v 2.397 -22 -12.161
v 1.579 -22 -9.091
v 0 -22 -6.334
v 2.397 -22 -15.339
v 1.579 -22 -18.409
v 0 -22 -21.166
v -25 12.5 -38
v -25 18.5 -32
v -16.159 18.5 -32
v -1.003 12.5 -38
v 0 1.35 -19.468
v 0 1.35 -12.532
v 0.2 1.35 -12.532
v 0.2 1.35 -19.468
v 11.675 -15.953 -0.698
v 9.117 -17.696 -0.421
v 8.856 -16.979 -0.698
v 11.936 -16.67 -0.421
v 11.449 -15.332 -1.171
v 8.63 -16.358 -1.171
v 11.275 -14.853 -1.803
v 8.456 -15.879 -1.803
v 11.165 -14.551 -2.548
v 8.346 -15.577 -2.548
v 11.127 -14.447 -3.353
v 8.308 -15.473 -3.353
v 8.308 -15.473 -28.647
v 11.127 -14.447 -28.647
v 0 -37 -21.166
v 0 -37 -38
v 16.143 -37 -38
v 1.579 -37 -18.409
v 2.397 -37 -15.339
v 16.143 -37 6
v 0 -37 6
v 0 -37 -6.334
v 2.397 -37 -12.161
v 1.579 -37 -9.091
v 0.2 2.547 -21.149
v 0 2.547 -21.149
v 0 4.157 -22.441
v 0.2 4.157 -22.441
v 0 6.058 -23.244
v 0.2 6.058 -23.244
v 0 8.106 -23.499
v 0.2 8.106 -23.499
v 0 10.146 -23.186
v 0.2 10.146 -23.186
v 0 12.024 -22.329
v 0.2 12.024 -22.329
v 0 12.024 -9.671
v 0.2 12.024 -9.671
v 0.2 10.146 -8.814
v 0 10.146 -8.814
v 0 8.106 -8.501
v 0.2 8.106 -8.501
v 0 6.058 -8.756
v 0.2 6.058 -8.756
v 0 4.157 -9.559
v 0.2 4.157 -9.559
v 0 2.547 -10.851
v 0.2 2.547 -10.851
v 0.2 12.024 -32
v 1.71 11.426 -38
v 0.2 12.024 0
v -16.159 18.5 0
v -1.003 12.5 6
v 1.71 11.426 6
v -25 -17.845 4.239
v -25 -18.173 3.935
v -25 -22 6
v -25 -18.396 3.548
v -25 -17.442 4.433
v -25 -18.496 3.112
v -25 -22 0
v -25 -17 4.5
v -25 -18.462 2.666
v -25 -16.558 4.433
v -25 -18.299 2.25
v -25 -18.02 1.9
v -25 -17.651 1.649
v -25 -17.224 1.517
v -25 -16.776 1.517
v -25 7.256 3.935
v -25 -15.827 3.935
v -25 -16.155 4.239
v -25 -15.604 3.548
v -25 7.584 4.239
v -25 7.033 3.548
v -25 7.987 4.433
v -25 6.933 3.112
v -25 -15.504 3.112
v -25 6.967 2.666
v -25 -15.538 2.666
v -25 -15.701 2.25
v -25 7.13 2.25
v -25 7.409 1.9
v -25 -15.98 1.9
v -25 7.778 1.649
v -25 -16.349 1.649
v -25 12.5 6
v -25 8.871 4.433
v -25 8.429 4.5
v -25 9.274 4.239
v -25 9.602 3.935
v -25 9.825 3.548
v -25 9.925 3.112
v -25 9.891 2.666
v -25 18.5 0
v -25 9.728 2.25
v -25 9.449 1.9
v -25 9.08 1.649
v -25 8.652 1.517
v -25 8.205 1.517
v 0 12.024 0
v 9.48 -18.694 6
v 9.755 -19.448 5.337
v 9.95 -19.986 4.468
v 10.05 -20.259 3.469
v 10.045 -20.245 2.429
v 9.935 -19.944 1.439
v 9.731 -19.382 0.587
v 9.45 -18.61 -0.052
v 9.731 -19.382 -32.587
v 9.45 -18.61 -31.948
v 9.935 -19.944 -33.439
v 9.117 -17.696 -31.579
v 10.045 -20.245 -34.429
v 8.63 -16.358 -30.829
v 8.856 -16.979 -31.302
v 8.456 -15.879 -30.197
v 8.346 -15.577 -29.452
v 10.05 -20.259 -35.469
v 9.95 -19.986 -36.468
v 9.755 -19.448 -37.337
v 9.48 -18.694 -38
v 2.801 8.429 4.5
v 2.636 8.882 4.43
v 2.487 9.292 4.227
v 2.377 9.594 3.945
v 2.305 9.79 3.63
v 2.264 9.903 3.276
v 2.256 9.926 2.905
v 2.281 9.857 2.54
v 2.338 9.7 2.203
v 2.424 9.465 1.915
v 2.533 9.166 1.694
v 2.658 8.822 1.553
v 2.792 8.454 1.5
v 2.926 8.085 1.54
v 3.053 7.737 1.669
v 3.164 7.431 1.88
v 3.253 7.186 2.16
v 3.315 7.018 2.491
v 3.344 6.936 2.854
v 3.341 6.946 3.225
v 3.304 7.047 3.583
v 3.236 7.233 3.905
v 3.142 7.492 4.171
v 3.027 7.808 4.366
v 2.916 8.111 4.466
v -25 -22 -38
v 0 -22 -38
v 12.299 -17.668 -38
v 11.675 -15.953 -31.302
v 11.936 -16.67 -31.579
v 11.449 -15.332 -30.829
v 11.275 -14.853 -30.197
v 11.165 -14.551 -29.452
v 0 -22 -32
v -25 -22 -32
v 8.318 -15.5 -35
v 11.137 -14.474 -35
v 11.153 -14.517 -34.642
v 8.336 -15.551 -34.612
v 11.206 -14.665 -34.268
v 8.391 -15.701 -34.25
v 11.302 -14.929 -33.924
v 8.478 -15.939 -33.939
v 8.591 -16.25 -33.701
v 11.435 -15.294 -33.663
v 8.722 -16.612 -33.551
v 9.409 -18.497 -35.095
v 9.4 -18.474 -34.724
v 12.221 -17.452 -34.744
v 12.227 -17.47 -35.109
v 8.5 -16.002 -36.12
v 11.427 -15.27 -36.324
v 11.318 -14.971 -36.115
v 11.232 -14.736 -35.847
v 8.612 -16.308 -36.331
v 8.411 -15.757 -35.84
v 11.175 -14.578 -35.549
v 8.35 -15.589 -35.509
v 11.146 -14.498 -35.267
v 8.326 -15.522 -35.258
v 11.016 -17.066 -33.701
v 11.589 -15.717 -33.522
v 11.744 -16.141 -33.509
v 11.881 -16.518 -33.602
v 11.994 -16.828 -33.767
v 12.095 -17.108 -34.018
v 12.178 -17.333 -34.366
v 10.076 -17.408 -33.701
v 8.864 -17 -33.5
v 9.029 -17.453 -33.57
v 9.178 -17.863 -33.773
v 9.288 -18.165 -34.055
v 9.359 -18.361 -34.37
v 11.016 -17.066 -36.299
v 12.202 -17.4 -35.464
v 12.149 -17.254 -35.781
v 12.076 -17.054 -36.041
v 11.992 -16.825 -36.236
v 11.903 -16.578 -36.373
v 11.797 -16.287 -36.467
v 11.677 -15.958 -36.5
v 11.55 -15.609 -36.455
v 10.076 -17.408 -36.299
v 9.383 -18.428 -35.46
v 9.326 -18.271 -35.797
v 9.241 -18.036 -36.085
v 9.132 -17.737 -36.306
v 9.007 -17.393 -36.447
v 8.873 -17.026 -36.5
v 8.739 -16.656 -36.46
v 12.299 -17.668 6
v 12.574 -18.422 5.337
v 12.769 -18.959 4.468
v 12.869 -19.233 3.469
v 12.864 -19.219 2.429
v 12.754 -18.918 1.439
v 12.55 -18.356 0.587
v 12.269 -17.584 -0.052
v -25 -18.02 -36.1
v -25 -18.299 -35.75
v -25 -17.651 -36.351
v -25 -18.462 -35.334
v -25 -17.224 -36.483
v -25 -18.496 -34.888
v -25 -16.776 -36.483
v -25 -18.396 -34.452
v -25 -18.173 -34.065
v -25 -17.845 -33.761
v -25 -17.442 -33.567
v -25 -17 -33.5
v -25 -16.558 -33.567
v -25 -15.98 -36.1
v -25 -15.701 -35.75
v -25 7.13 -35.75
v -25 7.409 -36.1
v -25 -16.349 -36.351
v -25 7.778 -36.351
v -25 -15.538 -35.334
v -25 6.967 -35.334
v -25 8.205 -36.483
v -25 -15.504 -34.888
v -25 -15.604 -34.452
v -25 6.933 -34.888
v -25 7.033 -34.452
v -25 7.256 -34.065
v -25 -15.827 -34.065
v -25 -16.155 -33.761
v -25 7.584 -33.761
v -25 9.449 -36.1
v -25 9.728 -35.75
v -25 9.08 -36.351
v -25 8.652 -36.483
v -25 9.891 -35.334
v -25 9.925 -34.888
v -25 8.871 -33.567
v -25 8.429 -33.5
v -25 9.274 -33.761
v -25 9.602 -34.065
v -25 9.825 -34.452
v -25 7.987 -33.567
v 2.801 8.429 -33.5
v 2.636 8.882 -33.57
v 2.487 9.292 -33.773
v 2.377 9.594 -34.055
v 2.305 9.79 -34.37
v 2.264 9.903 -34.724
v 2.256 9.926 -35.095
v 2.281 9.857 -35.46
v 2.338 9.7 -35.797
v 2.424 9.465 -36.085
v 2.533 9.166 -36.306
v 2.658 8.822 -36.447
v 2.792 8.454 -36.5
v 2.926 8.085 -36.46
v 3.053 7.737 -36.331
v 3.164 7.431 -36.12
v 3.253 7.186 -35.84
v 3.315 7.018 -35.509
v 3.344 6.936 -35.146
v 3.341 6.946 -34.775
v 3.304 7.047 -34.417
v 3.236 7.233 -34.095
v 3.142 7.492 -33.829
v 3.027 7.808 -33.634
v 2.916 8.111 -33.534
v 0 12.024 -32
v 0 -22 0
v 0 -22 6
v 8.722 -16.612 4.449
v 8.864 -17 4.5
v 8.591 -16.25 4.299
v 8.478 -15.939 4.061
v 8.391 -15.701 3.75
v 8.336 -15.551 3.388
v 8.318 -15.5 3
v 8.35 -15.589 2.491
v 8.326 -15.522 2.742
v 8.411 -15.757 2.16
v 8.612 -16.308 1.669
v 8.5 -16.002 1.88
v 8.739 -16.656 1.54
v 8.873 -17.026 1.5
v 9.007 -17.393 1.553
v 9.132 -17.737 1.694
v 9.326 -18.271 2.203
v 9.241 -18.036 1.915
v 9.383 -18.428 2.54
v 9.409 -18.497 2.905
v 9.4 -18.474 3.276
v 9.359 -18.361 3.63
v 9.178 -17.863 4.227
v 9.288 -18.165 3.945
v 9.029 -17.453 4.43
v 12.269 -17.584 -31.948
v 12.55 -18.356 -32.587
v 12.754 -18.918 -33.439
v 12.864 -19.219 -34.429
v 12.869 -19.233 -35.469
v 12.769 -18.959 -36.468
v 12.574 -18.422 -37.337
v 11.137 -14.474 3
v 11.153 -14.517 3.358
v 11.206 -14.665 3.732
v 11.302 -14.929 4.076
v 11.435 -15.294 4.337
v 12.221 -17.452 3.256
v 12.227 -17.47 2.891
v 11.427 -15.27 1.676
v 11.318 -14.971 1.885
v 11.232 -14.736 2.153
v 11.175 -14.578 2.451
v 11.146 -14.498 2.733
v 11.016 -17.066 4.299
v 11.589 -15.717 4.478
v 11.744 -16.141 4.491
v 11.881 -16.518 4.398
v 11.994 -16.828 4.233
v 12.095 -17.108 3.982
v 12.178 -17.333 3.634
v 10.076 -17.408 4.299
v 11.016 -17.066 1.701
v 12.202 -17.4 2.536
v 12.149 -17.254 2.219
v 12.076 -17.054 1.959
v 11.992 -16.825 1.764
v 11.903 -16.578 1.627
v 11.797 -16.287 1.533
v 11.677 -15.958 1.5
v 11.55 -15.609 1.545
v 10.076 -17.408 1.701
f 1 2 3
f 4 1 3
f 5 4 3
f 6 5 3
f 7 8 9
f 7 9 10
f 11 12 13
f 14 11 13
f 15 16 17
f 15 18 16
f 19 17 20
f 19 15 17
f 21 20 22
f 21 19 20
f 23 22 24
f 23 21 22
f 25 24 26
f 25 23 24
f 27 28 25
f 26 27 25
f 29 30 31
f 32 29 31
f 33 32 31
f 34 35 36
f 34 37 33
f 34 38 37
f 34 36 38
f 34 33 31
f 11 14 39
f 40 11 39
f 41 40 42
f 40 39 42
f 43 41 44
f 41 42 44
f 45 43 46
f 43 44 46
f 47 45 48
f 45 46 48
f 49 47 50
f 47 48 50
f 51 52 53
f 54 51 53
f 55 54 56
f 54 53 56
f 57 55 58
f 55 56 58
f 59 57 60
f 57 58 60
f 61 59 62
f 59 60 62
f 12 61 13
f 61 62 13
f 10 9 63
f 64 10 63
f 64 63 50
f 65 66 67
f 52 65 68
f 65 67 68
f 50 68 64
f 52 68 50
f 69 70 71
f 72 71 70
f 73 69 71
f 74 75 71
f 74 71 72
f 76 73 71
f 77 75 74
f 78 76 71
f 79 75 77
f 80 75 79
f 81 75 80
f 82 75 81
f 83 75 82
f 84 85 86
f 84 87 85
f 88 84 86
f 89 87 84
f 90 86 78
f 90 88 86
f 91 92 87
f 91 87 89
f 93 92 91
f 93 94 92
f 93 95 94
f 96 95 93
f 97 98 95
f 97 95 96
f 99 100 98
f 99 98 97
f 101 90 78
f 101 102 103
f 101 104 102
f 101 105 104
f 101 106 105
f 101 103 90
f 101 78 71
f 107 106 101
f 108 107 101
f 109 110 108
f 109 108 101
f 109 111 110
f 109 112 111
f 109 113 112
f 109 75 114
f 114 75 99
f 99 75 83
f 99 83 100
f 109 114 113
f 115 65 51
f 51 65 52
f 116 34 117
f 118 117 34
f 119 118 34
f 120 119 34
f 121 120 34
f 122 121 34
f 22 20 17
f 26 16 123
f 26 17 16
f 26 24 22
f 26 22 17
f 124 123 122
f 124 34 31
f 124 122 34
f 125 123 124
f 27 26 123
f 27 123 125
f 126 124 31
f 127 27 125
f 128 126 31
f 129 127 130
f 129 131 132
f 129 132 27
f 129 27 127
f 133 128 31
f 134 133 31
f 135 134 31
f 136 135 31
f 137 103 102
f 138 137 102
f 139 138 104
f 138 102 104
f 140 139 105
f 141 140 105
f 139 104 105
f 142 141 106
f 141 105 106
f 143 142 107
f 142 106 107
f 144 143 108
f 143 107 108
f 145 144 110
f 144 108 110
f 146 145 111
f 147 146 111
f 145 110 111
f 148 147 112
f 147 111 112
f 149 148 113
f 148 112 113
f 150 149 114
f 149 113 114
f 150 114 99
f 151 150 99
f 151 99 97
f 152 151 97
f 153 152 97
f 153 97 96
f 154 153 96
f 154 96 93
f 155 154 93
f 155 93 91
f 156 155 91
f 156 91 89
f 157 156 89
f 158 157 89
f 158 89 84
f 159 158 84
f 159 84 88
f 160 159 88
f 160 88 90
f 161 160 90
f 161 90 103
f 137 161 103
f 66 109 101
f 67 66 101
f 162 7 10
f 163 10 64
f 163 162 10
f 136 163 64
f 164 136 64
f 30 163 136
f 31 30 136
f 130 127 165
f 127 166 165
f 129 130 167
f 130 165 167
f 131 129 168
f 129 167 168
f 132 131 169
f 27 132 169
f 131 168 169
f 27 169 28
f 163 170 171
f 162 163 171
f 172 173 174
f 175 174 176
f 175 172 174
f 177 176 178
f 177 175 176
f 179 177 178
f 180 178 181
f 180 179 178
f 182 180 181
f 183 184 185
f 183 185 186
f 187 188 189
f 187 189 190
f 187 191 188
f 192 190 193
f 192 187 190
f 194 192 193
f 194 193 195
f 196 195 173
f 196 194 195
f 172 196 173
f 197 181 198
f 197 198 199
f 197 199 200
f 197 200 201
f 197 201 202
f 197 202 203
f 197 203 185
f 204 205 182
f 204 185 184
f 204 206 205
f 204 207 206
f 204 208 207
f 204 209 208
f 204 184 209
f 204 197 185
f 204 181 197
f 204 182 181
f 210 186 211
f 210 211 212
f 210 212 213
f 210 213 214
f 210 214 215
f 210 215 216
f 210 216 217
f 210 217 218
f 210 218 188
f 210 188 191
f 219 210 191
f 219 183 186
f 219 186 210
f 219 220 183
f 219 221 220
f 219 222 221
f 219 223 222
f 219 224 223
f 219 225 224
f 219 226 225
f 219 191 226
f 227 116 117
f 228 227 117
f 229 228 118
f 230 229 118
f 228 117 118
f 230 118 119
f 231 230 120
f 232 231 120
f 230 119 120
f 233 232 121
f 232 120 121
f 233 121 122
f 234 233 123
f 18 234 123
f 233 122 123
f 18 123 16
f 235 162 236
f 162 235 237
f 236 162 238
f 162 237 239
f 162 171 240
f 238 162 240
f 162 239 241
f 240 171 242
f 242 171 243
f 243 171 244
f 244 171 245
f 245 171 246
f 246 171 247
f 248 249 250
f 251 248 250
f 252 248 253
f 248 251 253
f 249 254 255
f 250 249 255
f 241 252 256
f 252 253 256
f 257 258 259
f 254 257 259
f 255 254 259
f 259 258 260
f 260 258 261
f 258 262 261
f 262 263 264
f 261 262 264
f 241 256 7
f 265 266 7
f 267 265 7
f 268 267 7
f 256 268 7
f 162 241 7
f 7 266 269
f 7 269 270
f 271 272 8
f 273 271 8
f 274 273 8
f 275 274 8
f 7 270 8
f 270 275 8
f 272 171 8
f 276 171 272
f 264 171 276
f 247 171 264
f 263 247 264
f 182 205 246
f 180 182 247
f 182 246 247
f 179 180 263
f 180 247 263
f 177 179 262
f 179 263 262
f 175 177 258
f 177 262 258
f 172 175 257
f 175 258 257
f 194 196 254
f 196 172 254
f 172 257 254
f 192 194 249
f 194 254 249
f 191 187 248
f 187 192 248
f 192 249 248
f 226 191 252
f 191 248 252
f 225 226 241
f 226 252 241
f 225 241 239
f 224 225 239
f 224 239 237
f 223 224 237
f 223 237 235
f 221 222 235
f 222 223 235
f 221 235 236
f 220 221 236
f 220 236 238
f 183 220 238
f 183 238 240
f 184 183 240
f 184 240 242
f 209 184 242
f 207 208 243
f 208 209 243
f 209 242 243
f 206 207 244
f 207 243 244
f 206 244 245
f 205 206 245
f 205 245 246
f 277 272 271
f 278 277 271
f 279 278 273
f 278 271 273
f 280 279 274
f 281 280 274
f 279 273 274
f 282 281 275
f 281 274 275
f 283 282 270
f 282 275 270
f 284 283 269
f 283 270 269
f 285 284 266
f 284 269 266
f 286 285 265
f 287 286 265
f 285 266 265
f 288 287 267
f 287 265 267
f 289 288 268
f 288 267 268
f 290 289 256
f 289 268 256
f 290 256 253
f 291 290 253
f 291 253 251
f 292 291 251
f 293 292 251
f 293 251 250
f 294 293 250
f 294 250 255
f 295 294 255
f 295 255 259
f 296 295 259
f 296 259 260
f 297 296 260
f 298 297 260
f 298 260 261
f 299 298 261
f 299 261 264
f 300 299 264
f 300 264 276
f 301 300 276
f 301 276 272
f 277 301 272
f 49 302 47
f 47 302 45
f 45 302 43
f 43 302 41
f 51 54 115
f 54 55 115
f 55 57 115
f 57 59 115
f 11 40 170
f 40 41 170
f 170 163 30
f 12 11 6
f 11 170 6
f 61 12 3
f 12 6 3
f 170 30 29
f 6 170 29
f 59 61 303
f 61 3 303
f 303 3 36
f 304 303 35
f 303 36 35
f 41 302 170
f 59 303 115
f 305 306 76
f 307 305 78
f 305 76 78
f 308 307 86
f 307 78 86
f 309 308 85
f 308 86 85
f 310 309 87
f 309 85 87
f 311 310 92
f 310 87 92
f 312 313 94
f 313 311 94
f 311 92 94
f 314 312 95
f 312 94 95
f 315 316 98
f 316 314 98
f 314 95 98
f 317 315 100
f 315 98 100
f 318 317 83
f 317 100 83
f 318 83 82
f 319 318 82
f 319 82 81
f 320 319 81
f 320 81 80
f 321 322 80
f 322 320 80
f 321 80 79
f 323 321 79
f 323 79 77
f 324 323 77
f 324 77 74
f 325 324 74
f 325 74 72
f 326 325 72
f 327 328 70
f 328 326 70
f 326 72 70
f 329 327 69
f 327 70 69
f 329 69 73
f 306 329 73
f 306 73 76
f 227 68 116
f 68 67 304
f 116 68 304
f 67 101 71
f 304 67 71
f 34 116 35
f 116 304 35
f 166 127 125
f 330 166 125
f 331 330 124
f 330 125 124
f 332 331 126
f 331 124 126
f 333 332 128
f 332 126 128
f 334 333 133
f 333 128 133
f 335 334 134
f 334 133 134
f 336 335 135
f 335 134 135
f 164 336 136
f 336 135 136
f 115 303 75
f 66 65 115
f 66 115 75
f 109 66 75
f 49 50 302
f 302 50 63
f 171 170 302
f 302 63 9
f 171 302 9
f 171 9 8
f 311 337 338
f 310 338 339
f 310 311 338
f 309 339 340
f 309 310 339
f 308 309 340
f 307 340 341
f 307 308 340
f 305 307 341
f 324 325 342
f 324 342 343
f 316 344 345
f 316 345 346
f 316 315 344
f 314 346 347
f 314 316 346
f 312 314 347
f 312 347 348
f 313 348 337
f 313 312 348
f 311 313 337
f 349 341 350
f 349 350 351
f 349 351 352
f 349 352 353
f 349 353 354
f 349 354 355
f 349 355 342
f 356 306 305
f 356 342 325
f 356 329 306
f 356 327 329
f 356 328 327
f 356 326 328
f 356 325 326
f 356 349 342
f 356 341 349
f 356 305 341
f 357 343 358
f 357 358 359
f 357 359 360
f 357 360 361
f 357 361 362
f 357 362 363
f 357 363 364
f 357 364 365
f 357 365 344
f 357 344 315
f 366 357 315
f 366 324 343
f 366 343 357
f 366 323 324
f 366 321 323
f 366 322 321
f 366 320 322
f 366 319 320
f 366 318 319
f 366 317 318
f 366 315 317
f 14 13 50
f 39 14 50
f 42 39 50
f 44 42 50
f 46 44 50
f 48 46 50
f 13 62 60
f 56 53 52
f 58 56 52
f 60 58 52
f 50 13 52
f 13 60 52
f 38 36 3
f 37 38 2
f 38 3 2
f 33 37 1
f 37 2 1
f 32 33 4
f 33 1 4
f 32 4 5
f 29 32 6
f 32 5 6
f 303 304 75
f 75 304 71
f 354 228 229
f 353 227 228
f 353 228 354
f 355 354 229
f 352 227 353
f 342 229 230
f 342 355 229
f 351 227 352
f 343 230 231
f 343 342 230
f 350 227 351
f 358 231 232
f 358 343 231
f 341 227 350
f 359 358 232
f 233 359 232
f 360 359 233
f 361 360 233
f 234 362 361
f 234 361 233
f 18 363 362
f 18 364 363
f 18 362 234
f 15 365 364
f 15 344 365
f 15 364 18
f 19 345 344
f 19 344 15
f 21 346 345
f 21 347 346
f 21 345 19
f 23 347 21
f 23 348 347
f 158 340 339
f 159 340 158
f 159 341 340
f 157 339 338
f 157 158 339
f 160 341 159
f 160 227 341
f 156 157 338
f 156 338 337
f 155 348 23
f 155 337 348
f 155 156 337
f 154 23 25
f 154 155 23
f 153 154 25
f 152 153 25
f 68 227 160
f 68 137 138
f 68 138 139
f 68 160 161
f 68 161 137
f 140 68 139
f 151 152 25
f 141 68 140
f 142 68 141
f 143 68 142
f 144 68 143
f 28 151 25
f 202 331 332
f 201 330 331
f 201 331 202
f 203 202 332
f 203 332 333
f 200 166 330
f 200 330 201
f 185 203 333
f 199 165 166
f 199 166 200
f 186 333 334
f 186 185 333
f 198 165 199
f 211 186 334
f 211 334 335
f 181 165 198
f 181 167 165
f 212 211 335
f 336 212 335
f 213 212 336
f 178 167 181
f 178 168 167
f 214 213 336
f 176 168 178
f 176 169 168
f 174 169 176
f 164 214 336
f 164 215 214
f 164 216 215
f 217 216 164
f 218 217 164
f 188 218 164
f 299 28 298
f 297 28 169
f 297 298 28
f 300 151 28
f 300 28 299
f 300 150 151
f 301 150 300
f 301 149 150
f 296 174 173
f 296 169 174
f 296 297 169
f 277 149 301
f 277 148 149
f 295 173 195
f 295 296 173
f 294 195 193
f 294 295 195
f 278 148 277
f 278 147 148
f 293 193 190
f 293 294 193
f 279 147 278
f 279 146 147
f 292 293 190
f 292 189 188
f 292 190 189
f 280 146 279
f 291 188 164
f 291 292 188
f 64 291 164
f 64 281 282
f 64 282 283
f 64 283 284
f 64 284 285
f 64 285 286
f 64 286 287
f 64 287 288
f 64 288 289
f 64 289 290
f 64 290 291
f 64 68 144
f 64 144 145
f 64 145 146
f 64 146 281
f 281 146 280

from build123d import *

# Parameters (mm, degrees)
BOSS_EXTRUDE1_DEPTH = 6
CUT_EXTRUDE1_DEPTH  = 59.057322490699136
BOSS_EXTRUDE2_DEPTH = 32
BOSS_EXTRUDE3_DEPTH = 0.2
BOSS_EXTRUDE4_DEPTH = 15
BOSS_EXTRUDE5_DEPTH = 6
CUT_EXTRUDE2_DEPTH  = 70.12779972477816
SKETCH8_R           = 1.5000000000000042
SKETCH8_R_2         = 1.5000000000000018
CUT_EXTRUDE3_DEPTH  = 70.12779972477817
SKETCH9_W           = 2.49999999999999
SKETCH9_H           = 5.999999999999993
BOSS_EXTRUDE6_DEPTH = 15
CUT_EXTRUDE4_DEPTH  = 3
BOSS_EXTRUDE7_DEPTH = 3
FILLET1_R           = 3


with BuildPart() as part:
    # Sketch1 → Boss-Extrude1 (new body)
    with BuildSketch(Plane.XY):
        Polygon((-25, 22.000000000000007), (1.7101007166283717, 11.425886468780801), (19.33568195921926, -36.99999999999998), (2.500000000000002, -36.999999999999986), (2.500000000000002, -21.999999999999986), (-25.000000000000004, -21.99999999999999), align=None)
    extrude(amount=BOSS_EXTRUDE1_DEPTH)

    # Sketch2 → Cut-Extrude1 (cut, through all)
    with BuildSketch(Plane.ZY.offset(25.000000000000004)):
        Polygon((-4.44e-15, 18.499999999999993), (5.999999999999988, 12.499999999999988), (5.999999999999991, 22.000000000000007), (0, 22.000000000000004), align=None)
    extrude(amount=-CUT_EXTRUDE1_DEPTH, mode=Mode.SUBTRACT)

    # Sketch3 → Boss-Extrude2 (add)
    with BuildSketch(Plane(origin=(0, 0, 0), x_dir=(-1, 0, 0), z_dir=(0, 0, -1))):
        Polygon((-1.7101007166283715, 11.425886468780803), (-19.33568195921926, -36.99999999999998), (-2.500000000000002, -36.999999999999986), (-2.500000000000002, -21.999999999999986), (0, -21.999999999999986), (-9.2e-16, 1.3500000000000014), (-0.2, 1.3499999999999996), (-0.2, 12.023711860403642), align=None)
    extrude(amount=BOSS_EXTRUDE2_DEPTH)

    # Sketch4 → Boss-Extrude3 (add)
    with BuildSketch(Plane.ZY.offset(-0.2)):
        with BuildLine():
            Line((-32, 12.02371186040364), (-32, 1.3499999999999996))
            Line((-32, 1.3499999999999996), (-19.46806862677186, 1.3499999999999996))
            ThreePointArc((-19.468068626771874, 1.3499999999999552), (-23.244240803514778, 6.058100110538283), (-22.32927664622476, 12.023711860403747))
            Line((-22.32927664622472, 12.02371186040364), (-32, 12.02371186040364))
        make_face()
        with BuildLine():
            ThreePointArc((-8.499999999999993, 7.999999999999998), (-9.586712438195622, 4.111588672786104), (-12.531931373228087, 1.3499999999999694))
            Line((-12.53193137322809, 1.3499999999999999), (0, 1.3499999999999999))
            Line((0, 1.3499999999999979), (0, 12.023711860403642))
            Line((0, 12.02371186040364), (-9.670723353775251, 12.02371186040364))
            ThreePointArc((-9.67072335377522, 12.023711860403733), (-8.798626004480603, 10.09528341201306), (-8.499999999999993, 8))
        make_face()
    extrude(amount=BOSS_EXTRUDE3_DEPTH)

    # Sketch5 → Boss-Extrude4 (add)
    with BuildSketch(Plane.XZ.offset(21.999999999999986)):
        with BuildLine():
            Line((-1.86e-15, 0), (-1.86e-15, -6.333801512904159))
            ThreePointArc((-1.1013e-13, -6.333801512904192), (1.8581867686024491, -9.836881046371968), (2.4999999999999964, -13.750000014767066))
            Line((2.4999999999999973, -13.750000014767064), (2.4999999999999973, 6.000000000000006))
            Line((2.4999999999999973, 6.000000000000006), (-1.8e-15, 6))
            Line((-1.8e-15, 6), (-1.86e-15, 0))
        make_face()
        with BuildLine():
            Line((-1.86e-15, -21.166198487095418), (-1.86e-15, -32))
            Line((-1.78e-15, -32), (2.4999999999999973, -32))
            Line((2.4999999999999973, -32), (2.4999999999999973, -13.750000014767064))
            ThreePointArc((2.4999999999999964, -13.750000014767066), (1.8581867638853513, -17.6631189676212), (1.4744e-13, -21.166198487095464))
        make_face()
    extrude(amount=BOSS_EXTRUDE4_DEPTH)

    # Sketch6 → Boss-Extrude5 (add)
    with BuildSketch(Plane(origin=(2.66e-15, 0, -32), x_dir=(-1, 0, -8e-17), z_dir=(8e-17, 0, -1))):
        Polygon((25, 22.000000000000007), (-1.7101007166283717, 11.425886468780801), (-19.33568195921926, -36.99999999999998), (-2.500000000000002, -36.999999999999986), (-2.500000000000002, -21.999999999999986), (25.000000000000004, -21.99999999999999), align=None)
    extrude(amount=BOSS_EXTRUDE5_DEPTH)

    # Sketch7 → Cut-Extrude2 (cut, through all)
    with BuildSketch(Plane.ZY.offset(25.000000000000004)):
        Polygon((-38.00000000000001, 22.000000000000004), (-32, 22.000000000000004), (-32, 18.499999999999982), (-38.00000000000001, 12.49999999999995), align=None)
    extrude(amount=-CUT_EXTRUDE2_DEPTH, mode=Mode.SUBTRACT)

    # Sketch8 → Cut-Extrude3 (cut, through all)
    with BuildSketch(Plane.ZY.offset(25.000000000000004)):
        with Locations((-34.99999999999999, 8.428932188134494)):
            Circle(SKETCH8_R)
        with Locations((-34.99999999999999, -17.000000000000004)):
            Circle(SKETCH8_R)
        with Locations((3.0000000000000027, -16.99999999999999)):
            Circle(SKETCH8_R_2)
        with Locations((2.9999999999999956, 8.428932188134505)):
            Circle(SKETCH8_R_2)
    extrude(amount=-CUT_EXTRUDE3_DEPTH, mode=Mode.SUBTRACT)

    # Sketch9 → Boss-Extrude6 (add)
    with BuildSketch(Plane.XZ.offset(36.999999999999986)):
        with Locations((1.249999999999995, -35)):
            Rectangle(SKETCH9_W, SKETCH9_H)
    extrude(amount=-BOSS_EXTRUDE6_DEPTH)

    # Sketch10 → Cut-Extrude4 (cut)
    with BuildSketch(Plane(origin=(5.182266059796382, 1.8861905918139033, 0), x_dir=(0, 0, -1), z_dir=(0.939692620785907, 0.34202014332567265, 0))):
        Polygon((37.99999999999999, -41.38181968407034), (37.99999999999999, -17.381819684070333), (-5.999999999999991, -17.381819684070337), (-6.00000000000001, -41.38181968407034), align=None)
    extrude(amount=-CUT_EXTRUDE4_DEPTH, mode=Mode.SUBTRACT)

    # Sketch11 → Boss-Extrude7 (add)
    # profile 1 of 2: a face of its own
    with BuildSketch(Plane(origin=(2.363188197438662, 0.8601301618368854, 0), x_dir=(0, 0, -1), z_dir=(0.939692620785907, 0.3420201433256727, 0))):
        with BuildLine():
            ThreePointArc((0.499999999999996, -19.00635353175345), (0.39856604189581324, -18.16984360421368), (0.10014350921565462, -17.38181968407036))
            Line((0.10014350921566262, -17.38181968407034), (-5.999999999999993, -17.38181968407034))
            Line((-5.999999999999991, -17.38181968407034), (-5.999999999999994, -20.809129169485423))
            ThreePointArc((-6.000000000000014, -20.809129169485427), (-2.0645856533065285, -22.379037922561462), (0.499999999999996, -19.00635353175345))
        make_face()
        with BuildLine():
            add(Edge.make_bspline(
                [(-3.000000000000003, -17.410086873039575), (-5.598076211353321, -17.410086873039575), (-4.299038105676663, -19.804486861110384), (-3.0000000000000044, -22.198886849181193), (-1.7009618943233444, -19.804486861110384), (-0.4019237886466831, -17.410086873039578), (-3.0000000000000027, -17.410086873039575)],
                knots=[0, 0, 0, 2.0943951023931953, 2.0943951023931953, 4.1887902047863905, 4.1887902047863905, 6.283185307179586, 6.283185307179586, 6.283185307179586], degree=2, weights=[1, 0.5000000000000001, 1, 0.5000000000000001, 1, 0.5000000000000001, 1]))
        make_face(mode=Mode.SUBTRACT)
    # profile 2 of 2: a face of its own
    with BuildSketch(Plane(origin=(2.363188197438662, 0.8601301618368854, 0), x_dir=(0, 0, -1), z_dir=(0.939692620785907, 0.3420201433256727, 0))):
        with BuildLine():
            Line((37.99999999999999, -20.809129169485587), (37.99999999999999, -17.381819684070337))
            Line((37.99999999999999, -17.381819684070337), (31.899856490784423, -17.381819684070337))
            ThreePointArc((31.899856490784394, -17.38181968407025), (33.28561388310159, -22.057727032684816), (37.99999999999992, -20.80912916948557))
        make_face()
        with BuildLine():
            add(Edge.make_bspline(
                [(34.999999999999986, -17.41008687303959), (32.40192378864666, -17.41008687303959), (33.70096189432332, -19.8044868611104), (34.999999999999986, -22.198886849181218), (36.299038105676644, -19.804486861110405), (37.59807621135331, -17.410086873039592), (34.999999999999986, -17.41008687303959)],
                knots=[0, 0, 0, 2.0943951023931953, 2.0943951023931953, 4.1887902047863905, 4.1887902047863905, 6.283185307179586, 6.283185307179586, 6.283185307179586], degree=2, weights=[1, 0.5000000000000001, 1, 0.5000000000000001, 1, 0.5000000000000001, 1]))
        make_face(mode=Mode.SUBTRACT)
    extrude(amount=BOSS_EXTRUDE7_DEPTH)

    # Fillet1
    fillet1_edges = [part.edges().sort_by_distance(p)[0] for p in [
        (9.717659588224263, -14.960407316126739, -0.10014350921565796),
        (9.717659588224242, -14.960407316126686, -31.89985649078441),
    ]]
    fillet(fillet1_edges, radius=FILLET1_R)


solid = part.part
